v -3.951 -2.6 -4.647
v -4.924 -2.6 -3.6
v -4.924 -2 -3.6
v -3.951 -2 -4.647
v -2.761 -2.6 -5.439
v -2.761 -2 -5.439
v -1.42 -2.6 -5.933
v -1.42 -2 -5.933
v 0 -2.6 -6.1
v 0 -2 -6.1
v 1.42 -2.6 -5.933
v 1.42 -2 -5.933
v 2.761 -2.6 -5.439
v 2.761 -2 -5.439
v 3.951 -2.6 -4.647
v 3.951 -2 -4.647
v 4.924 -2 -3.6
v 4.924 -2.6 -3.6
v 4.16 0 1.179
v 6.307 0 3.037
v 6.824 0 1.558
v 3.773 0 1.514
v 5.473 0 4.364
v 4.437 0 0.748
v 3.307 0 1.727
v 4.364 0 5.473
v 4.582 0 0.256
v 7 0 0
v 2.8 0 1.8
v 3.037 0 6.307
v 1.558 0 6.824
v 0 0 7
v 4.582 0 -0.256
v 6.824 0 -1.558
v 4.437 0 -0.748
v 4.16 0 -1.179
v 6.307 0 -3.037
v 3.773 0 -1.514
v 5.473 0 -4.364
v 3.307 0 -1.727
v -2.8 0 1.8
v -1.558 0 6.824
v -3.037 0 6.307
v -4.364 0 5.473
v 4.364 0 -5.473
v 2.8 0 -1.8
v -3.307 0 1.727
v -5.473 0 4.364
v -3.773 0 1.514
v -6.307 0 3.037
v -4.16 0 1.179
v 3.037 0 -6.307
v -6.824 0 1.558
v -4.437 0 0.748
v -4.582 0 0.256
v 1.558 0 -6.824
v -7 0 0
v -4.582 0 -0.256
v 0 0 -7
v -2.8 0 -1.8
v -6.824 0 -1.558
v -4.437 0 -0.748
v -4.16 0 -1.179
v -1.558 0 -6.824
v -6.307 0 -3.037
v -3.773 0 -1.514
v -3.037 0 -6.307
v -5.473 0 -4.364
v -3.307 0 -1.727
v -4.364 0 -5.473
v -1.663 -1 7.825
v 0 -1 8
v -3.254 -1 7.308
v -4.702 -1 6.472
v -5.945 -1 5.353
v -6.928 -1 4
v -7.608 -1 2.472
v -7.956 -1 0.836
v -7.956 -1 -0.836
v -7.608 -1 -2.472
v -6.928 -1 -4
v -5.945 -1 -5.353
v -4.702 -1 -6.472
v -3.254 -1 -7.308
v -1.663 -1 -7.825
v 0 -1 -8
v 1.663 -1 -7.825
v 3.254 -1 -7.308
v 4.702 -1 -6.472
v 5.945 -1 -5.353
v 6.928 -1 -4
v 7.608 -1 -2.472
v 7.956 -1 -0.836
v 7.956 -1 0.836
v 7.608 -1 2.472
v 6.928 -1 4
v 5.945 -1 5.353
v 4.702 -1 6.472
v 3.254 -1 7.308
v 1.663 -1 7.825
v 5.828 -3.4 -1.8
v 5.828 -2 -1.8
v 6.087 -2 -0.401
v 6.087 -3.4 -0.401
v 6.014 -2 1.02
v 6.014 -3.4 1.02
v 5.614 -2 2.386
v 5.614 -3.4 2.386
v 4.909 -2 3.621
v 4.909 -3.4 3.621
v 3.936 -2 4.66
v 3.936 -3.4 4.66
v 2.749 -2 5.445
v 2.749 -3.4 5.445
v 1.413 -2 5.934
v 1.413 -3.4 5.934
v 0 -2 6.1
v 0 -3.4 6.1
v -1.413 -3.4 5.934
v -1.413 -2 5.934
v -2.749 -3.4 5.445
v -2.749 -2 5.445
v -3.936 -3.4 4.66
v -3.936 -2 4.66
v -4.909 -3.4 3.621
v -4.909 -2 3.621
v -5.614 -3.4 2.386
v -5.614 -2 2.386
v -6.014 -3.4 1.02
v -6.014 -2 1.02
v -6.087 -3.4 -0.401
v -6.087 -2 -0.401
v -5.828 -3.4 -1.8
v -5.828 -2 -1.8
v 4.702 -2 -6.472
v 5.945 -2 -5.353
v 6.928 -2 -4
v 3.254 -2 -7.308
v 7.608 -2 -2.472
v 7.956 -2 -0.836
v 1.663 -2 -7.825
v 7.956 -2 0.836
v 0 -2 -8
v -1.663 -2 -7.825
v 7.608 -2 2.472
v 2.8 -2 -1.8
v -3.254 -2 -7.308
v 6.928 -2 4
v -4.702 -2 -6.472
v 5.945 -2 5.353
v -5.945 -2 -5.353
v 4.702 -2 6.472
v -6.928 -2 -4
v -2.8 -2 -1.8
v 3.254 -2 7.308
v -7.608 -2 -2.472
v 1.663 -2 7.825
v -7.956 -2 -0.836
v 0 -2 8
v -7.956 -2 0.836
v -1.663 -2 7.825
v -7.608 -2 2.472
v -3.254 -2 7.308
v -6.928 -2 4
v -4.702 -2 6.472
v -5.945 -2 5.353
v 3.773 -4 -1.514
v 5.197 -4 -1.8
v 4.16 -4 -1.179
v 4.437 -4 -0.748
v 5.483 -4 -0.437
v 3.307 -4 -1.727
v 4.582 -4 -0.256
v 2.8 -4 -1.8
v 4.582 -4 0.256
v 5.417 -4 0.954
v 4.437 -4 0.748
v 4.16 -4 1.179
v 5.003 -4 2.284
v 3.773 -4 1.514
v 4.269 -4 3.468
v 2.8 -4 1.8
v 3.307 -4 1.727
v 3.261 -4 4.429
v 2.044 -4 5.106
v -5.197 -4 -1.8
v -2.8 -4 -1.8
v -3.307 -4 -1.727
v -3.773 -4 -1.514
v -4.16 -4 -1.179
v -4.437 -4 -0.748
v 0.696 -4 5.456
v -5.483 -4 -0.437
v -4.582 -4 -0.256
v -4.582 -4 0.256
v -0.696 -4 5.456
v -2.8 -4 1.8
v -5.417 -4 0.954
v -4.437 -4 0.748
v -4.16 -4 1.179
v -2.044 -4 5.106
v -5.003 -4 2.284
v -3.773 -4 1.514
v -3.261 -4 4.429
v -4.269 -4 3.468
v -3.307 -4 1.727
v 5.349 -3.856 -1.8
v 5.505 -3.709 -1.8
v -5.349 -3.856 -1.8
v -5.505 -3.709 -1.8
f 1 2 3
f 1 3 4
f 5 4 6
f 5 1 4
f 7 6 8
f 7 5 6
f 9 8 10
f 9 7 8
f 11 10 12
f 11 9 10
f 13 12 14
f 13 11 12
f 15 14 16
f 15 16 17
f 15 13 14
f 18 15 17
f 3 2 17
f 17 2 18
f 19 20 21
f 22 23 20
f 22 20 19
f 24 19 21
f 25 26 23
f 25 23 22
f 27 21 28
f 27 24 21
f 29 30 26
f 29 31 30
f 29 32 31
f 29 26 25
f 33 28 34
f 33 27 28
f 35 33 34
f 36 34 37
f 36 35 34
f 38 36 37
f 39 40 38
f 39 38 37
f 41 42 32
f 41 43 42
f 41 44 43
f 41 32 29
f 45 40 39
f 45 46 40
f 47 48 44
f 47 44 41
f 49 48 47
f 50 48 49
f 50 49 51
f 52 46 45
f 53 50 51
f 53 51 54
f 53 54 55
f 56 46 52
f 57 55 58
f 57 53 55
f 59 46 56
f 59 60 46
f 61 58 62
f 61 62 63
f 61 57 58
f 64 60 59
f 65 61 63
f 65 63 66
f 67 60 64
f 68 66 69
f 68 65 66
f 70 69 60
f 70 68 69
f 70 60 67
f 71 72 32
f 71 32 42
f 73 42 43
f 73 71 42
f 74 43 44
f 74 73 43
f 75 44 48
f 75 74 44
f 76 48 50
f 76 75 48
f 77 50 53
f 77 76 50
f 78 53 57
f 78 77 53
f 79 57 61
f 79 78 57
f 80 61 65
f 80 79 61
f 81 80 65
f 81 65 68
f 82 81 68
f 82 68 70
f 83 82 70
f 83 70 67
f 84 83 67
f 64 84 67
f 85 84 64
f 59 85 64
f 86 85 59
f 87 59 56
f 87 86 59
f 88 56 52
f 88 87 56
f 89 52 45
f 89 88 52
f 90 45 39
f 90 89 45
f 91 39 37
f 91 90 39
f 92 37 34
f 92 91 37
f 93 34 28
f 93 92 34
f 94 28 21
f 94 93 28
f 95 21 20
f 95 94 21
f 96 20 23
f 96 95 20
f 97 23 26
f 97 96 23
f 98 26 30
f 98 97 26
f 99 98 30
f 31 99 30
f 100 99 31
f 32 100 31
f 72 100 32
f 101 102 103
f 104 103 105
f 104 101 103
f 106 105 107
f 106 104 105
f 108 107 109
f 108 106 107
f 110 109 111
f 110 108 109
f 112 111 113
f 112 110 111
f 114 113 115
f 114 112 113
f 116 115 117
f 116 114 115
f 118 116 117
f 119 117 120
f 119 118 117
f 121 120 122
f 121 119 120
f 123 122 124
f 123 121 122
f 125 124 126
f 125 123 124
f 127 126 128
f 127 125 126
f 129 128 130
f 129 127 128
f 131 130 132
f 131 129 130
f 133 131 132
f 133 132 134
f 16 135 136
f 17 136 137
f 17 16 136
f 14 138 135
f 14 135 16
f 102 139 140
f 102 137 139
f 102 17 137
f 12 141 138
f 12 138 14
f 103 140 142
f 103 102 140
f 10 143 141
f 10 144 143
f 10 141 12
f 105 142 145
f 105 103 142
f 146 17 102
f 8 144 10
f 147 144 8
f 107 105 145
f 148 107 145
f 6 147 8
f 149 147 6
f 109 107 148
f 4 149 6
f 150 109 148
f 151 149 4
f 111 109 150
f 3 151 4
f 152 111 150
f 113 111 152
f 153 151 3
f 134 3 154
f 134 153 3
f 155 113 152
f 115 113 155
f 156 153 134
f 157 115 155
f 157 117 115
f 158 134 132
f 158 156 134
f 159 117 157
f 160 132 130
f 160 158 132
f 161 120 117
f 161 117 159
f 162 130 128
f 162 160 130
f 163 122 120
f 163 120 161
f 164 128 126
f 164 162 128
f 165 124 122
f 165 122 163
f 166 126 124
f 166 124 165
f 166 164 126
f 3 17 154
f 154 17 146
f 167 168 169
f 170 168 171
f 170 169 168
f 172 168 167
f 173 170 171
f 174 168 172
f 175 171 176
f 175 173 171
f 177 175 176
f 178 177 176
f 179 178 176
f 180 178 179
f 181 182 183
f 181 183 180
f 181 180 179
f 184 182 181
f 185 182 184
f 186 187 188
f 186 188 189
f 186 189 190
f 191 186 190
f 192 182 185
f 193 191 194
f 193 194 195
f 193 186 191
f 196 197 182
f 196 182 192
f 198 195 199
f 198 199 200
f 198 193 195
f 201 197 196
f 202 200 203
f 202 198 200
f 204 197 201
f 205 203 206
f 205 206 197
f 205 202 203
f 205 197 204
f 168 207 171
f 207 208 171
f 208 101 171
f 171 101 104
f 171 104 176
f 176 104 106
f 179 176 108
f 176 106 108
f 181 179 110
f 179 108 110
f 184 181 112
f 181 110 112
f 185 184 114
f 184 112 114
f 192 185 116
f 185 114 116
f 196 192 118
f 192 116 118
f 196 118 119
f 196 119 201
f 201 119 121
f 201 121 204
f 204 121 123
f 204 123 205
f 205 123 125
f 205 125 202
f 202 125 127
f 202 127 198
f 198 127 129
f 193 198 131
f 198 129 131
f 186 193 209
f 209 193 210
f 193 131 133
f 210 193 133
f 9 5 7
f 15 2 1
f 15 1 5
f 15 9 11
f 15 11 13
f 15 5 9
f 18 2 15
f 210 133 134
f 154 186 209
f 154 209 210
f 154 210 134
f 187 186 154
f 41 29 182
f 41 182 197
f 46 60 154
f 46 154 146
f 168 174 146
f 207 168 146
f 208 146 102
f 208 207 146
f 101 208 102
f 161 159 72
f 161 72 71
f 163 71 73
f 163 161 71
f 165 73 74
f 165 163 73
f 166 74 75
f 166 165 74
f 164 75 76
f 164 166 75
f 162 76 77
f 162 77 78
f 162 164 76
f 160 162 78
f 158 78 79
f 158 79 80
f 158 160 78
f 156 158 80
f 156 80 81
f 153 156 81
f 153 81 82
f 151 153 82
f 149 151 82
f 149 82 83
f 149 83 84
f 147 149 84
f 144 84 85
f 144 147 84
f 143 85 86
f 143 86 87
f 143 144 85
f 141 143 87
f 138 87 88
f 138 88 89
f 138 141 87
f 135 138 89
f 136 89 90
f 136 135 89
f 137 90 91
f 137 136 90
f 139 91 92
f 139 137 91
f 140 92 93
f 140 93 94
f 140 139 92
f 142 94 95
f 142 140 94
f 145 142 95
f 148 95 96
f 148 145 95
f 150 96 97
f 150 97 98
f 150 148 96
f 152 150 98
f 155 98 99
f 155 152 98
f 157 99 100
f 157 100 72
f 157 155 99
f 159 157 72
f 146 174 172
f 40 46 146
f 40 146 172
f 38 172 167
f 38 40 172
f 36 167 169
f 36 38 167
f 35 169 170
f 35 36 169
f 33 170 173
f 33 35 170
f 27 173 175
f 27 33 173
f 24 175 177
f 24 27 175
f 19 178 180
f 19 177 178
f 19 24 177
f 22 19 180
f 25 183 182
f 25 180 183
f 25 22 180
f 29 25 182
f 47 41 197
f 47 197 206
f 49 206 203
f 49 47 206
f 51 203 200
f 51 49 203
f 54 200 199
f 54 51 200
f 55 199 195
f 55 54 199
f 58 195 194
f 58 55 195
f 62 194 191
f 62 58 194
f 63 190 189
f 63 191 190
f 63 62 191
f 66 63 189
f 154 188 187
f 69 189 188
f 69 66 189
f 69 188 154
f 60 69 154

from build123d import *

# Parameters (mm, degrees)
CUT_EXTRUDE1_DEPTH = 13
SKETCH4_W          = 21.205208
SKETCH4_H          = 1.8
CUT_EXTRUDE2_DEPTH = 2
SKETCH5_W          = 20.395214747
SKETCH5_H          = 5.649183718
CUT_EXTRUDE3_DEPTH = 1.4
CHAMFER1_SIZE      = 1
CHAMFER2_SIZE      = 0.6


with BuildPart() as part:
    # Sketch1 → Revolve1 (revolve)
    with BuildSketch(Plane.XY, mode=Mode.PRIVATE) as revolve1_sk:
        Polygon((0, 0), (-8, 0), (-8, -2), (-6.1, -2), (-6.1, -4), (0, -4), align=None)
    revolve(revolve1_sk.sketch.rotate(Axis((0, 0, 0), (0, -1, 0)), 270), axis=Axis((0, 0, 0), (0, -1, 0)))

    # Sketch3 → Cut-Extrude1 (cut, through all)
    with BuildSketch(Plane(origin=(0, 0, 0), x_dir=(1, 0, 0), z_dir=(0, 1, 0))):
        with BuildLine():
            Line((-2.8, 1.8), (2.8, 1.8))
            ThreePointArc((2.8, 1.8), (4.6, 0), (2.8, -1.8))
            Line((2.8, -1.8), (-2.8, -1.8))
            ThreePointArc((-2.8, -1.8), (-4.6, 0), (-2.8, 1.8))
        make_face()
    extrude(amount=-CUT_EXTRUDE1_DEPTH, mode=Mode.SUBTRACT)

    # Sketch4 → Cut-Extrude2 (cut)
    with BuildSketch(Plane.XZ.offset(4)):
        with Locations((0.56076456, -2.7)):
            Rectangle(SKETCH4_W, SKETCH4_H)
    extrude(amount=-CUT_EXTRUDE2_DEPTH, mode=Mode.SUBTRACT)

    # Sketch5 → Cut-Extrude3 (cut)
    with BuildSketch(Plane.XZ.offset(4)):
        with Locations((-0.031153587, -4.97418934)):
            Rectangle(SKETCH5_W, SKETCH5_H)
    extrude(amount=-CUT_EXTRUDE3_DEPTH, mode=Mode.SUBTRACT)

    # Chamfer1
    chamfer1_edges = [part.edges().sort_by_distance(p)[0] for p in [
        (0, 0, -8),
    ]]
    chamfer(chamfer1_edges, length=CHAMFER1_SIZE)

    # Chamfer2
    chamfer2_edges = [part.edges().sort_by_distance(p)[0] for p in [
        (0, -4, 6.1),
    ]]
    chamfer(chamfer2_edges, length=CHAMFER2_SIZE)


solid = part.part
